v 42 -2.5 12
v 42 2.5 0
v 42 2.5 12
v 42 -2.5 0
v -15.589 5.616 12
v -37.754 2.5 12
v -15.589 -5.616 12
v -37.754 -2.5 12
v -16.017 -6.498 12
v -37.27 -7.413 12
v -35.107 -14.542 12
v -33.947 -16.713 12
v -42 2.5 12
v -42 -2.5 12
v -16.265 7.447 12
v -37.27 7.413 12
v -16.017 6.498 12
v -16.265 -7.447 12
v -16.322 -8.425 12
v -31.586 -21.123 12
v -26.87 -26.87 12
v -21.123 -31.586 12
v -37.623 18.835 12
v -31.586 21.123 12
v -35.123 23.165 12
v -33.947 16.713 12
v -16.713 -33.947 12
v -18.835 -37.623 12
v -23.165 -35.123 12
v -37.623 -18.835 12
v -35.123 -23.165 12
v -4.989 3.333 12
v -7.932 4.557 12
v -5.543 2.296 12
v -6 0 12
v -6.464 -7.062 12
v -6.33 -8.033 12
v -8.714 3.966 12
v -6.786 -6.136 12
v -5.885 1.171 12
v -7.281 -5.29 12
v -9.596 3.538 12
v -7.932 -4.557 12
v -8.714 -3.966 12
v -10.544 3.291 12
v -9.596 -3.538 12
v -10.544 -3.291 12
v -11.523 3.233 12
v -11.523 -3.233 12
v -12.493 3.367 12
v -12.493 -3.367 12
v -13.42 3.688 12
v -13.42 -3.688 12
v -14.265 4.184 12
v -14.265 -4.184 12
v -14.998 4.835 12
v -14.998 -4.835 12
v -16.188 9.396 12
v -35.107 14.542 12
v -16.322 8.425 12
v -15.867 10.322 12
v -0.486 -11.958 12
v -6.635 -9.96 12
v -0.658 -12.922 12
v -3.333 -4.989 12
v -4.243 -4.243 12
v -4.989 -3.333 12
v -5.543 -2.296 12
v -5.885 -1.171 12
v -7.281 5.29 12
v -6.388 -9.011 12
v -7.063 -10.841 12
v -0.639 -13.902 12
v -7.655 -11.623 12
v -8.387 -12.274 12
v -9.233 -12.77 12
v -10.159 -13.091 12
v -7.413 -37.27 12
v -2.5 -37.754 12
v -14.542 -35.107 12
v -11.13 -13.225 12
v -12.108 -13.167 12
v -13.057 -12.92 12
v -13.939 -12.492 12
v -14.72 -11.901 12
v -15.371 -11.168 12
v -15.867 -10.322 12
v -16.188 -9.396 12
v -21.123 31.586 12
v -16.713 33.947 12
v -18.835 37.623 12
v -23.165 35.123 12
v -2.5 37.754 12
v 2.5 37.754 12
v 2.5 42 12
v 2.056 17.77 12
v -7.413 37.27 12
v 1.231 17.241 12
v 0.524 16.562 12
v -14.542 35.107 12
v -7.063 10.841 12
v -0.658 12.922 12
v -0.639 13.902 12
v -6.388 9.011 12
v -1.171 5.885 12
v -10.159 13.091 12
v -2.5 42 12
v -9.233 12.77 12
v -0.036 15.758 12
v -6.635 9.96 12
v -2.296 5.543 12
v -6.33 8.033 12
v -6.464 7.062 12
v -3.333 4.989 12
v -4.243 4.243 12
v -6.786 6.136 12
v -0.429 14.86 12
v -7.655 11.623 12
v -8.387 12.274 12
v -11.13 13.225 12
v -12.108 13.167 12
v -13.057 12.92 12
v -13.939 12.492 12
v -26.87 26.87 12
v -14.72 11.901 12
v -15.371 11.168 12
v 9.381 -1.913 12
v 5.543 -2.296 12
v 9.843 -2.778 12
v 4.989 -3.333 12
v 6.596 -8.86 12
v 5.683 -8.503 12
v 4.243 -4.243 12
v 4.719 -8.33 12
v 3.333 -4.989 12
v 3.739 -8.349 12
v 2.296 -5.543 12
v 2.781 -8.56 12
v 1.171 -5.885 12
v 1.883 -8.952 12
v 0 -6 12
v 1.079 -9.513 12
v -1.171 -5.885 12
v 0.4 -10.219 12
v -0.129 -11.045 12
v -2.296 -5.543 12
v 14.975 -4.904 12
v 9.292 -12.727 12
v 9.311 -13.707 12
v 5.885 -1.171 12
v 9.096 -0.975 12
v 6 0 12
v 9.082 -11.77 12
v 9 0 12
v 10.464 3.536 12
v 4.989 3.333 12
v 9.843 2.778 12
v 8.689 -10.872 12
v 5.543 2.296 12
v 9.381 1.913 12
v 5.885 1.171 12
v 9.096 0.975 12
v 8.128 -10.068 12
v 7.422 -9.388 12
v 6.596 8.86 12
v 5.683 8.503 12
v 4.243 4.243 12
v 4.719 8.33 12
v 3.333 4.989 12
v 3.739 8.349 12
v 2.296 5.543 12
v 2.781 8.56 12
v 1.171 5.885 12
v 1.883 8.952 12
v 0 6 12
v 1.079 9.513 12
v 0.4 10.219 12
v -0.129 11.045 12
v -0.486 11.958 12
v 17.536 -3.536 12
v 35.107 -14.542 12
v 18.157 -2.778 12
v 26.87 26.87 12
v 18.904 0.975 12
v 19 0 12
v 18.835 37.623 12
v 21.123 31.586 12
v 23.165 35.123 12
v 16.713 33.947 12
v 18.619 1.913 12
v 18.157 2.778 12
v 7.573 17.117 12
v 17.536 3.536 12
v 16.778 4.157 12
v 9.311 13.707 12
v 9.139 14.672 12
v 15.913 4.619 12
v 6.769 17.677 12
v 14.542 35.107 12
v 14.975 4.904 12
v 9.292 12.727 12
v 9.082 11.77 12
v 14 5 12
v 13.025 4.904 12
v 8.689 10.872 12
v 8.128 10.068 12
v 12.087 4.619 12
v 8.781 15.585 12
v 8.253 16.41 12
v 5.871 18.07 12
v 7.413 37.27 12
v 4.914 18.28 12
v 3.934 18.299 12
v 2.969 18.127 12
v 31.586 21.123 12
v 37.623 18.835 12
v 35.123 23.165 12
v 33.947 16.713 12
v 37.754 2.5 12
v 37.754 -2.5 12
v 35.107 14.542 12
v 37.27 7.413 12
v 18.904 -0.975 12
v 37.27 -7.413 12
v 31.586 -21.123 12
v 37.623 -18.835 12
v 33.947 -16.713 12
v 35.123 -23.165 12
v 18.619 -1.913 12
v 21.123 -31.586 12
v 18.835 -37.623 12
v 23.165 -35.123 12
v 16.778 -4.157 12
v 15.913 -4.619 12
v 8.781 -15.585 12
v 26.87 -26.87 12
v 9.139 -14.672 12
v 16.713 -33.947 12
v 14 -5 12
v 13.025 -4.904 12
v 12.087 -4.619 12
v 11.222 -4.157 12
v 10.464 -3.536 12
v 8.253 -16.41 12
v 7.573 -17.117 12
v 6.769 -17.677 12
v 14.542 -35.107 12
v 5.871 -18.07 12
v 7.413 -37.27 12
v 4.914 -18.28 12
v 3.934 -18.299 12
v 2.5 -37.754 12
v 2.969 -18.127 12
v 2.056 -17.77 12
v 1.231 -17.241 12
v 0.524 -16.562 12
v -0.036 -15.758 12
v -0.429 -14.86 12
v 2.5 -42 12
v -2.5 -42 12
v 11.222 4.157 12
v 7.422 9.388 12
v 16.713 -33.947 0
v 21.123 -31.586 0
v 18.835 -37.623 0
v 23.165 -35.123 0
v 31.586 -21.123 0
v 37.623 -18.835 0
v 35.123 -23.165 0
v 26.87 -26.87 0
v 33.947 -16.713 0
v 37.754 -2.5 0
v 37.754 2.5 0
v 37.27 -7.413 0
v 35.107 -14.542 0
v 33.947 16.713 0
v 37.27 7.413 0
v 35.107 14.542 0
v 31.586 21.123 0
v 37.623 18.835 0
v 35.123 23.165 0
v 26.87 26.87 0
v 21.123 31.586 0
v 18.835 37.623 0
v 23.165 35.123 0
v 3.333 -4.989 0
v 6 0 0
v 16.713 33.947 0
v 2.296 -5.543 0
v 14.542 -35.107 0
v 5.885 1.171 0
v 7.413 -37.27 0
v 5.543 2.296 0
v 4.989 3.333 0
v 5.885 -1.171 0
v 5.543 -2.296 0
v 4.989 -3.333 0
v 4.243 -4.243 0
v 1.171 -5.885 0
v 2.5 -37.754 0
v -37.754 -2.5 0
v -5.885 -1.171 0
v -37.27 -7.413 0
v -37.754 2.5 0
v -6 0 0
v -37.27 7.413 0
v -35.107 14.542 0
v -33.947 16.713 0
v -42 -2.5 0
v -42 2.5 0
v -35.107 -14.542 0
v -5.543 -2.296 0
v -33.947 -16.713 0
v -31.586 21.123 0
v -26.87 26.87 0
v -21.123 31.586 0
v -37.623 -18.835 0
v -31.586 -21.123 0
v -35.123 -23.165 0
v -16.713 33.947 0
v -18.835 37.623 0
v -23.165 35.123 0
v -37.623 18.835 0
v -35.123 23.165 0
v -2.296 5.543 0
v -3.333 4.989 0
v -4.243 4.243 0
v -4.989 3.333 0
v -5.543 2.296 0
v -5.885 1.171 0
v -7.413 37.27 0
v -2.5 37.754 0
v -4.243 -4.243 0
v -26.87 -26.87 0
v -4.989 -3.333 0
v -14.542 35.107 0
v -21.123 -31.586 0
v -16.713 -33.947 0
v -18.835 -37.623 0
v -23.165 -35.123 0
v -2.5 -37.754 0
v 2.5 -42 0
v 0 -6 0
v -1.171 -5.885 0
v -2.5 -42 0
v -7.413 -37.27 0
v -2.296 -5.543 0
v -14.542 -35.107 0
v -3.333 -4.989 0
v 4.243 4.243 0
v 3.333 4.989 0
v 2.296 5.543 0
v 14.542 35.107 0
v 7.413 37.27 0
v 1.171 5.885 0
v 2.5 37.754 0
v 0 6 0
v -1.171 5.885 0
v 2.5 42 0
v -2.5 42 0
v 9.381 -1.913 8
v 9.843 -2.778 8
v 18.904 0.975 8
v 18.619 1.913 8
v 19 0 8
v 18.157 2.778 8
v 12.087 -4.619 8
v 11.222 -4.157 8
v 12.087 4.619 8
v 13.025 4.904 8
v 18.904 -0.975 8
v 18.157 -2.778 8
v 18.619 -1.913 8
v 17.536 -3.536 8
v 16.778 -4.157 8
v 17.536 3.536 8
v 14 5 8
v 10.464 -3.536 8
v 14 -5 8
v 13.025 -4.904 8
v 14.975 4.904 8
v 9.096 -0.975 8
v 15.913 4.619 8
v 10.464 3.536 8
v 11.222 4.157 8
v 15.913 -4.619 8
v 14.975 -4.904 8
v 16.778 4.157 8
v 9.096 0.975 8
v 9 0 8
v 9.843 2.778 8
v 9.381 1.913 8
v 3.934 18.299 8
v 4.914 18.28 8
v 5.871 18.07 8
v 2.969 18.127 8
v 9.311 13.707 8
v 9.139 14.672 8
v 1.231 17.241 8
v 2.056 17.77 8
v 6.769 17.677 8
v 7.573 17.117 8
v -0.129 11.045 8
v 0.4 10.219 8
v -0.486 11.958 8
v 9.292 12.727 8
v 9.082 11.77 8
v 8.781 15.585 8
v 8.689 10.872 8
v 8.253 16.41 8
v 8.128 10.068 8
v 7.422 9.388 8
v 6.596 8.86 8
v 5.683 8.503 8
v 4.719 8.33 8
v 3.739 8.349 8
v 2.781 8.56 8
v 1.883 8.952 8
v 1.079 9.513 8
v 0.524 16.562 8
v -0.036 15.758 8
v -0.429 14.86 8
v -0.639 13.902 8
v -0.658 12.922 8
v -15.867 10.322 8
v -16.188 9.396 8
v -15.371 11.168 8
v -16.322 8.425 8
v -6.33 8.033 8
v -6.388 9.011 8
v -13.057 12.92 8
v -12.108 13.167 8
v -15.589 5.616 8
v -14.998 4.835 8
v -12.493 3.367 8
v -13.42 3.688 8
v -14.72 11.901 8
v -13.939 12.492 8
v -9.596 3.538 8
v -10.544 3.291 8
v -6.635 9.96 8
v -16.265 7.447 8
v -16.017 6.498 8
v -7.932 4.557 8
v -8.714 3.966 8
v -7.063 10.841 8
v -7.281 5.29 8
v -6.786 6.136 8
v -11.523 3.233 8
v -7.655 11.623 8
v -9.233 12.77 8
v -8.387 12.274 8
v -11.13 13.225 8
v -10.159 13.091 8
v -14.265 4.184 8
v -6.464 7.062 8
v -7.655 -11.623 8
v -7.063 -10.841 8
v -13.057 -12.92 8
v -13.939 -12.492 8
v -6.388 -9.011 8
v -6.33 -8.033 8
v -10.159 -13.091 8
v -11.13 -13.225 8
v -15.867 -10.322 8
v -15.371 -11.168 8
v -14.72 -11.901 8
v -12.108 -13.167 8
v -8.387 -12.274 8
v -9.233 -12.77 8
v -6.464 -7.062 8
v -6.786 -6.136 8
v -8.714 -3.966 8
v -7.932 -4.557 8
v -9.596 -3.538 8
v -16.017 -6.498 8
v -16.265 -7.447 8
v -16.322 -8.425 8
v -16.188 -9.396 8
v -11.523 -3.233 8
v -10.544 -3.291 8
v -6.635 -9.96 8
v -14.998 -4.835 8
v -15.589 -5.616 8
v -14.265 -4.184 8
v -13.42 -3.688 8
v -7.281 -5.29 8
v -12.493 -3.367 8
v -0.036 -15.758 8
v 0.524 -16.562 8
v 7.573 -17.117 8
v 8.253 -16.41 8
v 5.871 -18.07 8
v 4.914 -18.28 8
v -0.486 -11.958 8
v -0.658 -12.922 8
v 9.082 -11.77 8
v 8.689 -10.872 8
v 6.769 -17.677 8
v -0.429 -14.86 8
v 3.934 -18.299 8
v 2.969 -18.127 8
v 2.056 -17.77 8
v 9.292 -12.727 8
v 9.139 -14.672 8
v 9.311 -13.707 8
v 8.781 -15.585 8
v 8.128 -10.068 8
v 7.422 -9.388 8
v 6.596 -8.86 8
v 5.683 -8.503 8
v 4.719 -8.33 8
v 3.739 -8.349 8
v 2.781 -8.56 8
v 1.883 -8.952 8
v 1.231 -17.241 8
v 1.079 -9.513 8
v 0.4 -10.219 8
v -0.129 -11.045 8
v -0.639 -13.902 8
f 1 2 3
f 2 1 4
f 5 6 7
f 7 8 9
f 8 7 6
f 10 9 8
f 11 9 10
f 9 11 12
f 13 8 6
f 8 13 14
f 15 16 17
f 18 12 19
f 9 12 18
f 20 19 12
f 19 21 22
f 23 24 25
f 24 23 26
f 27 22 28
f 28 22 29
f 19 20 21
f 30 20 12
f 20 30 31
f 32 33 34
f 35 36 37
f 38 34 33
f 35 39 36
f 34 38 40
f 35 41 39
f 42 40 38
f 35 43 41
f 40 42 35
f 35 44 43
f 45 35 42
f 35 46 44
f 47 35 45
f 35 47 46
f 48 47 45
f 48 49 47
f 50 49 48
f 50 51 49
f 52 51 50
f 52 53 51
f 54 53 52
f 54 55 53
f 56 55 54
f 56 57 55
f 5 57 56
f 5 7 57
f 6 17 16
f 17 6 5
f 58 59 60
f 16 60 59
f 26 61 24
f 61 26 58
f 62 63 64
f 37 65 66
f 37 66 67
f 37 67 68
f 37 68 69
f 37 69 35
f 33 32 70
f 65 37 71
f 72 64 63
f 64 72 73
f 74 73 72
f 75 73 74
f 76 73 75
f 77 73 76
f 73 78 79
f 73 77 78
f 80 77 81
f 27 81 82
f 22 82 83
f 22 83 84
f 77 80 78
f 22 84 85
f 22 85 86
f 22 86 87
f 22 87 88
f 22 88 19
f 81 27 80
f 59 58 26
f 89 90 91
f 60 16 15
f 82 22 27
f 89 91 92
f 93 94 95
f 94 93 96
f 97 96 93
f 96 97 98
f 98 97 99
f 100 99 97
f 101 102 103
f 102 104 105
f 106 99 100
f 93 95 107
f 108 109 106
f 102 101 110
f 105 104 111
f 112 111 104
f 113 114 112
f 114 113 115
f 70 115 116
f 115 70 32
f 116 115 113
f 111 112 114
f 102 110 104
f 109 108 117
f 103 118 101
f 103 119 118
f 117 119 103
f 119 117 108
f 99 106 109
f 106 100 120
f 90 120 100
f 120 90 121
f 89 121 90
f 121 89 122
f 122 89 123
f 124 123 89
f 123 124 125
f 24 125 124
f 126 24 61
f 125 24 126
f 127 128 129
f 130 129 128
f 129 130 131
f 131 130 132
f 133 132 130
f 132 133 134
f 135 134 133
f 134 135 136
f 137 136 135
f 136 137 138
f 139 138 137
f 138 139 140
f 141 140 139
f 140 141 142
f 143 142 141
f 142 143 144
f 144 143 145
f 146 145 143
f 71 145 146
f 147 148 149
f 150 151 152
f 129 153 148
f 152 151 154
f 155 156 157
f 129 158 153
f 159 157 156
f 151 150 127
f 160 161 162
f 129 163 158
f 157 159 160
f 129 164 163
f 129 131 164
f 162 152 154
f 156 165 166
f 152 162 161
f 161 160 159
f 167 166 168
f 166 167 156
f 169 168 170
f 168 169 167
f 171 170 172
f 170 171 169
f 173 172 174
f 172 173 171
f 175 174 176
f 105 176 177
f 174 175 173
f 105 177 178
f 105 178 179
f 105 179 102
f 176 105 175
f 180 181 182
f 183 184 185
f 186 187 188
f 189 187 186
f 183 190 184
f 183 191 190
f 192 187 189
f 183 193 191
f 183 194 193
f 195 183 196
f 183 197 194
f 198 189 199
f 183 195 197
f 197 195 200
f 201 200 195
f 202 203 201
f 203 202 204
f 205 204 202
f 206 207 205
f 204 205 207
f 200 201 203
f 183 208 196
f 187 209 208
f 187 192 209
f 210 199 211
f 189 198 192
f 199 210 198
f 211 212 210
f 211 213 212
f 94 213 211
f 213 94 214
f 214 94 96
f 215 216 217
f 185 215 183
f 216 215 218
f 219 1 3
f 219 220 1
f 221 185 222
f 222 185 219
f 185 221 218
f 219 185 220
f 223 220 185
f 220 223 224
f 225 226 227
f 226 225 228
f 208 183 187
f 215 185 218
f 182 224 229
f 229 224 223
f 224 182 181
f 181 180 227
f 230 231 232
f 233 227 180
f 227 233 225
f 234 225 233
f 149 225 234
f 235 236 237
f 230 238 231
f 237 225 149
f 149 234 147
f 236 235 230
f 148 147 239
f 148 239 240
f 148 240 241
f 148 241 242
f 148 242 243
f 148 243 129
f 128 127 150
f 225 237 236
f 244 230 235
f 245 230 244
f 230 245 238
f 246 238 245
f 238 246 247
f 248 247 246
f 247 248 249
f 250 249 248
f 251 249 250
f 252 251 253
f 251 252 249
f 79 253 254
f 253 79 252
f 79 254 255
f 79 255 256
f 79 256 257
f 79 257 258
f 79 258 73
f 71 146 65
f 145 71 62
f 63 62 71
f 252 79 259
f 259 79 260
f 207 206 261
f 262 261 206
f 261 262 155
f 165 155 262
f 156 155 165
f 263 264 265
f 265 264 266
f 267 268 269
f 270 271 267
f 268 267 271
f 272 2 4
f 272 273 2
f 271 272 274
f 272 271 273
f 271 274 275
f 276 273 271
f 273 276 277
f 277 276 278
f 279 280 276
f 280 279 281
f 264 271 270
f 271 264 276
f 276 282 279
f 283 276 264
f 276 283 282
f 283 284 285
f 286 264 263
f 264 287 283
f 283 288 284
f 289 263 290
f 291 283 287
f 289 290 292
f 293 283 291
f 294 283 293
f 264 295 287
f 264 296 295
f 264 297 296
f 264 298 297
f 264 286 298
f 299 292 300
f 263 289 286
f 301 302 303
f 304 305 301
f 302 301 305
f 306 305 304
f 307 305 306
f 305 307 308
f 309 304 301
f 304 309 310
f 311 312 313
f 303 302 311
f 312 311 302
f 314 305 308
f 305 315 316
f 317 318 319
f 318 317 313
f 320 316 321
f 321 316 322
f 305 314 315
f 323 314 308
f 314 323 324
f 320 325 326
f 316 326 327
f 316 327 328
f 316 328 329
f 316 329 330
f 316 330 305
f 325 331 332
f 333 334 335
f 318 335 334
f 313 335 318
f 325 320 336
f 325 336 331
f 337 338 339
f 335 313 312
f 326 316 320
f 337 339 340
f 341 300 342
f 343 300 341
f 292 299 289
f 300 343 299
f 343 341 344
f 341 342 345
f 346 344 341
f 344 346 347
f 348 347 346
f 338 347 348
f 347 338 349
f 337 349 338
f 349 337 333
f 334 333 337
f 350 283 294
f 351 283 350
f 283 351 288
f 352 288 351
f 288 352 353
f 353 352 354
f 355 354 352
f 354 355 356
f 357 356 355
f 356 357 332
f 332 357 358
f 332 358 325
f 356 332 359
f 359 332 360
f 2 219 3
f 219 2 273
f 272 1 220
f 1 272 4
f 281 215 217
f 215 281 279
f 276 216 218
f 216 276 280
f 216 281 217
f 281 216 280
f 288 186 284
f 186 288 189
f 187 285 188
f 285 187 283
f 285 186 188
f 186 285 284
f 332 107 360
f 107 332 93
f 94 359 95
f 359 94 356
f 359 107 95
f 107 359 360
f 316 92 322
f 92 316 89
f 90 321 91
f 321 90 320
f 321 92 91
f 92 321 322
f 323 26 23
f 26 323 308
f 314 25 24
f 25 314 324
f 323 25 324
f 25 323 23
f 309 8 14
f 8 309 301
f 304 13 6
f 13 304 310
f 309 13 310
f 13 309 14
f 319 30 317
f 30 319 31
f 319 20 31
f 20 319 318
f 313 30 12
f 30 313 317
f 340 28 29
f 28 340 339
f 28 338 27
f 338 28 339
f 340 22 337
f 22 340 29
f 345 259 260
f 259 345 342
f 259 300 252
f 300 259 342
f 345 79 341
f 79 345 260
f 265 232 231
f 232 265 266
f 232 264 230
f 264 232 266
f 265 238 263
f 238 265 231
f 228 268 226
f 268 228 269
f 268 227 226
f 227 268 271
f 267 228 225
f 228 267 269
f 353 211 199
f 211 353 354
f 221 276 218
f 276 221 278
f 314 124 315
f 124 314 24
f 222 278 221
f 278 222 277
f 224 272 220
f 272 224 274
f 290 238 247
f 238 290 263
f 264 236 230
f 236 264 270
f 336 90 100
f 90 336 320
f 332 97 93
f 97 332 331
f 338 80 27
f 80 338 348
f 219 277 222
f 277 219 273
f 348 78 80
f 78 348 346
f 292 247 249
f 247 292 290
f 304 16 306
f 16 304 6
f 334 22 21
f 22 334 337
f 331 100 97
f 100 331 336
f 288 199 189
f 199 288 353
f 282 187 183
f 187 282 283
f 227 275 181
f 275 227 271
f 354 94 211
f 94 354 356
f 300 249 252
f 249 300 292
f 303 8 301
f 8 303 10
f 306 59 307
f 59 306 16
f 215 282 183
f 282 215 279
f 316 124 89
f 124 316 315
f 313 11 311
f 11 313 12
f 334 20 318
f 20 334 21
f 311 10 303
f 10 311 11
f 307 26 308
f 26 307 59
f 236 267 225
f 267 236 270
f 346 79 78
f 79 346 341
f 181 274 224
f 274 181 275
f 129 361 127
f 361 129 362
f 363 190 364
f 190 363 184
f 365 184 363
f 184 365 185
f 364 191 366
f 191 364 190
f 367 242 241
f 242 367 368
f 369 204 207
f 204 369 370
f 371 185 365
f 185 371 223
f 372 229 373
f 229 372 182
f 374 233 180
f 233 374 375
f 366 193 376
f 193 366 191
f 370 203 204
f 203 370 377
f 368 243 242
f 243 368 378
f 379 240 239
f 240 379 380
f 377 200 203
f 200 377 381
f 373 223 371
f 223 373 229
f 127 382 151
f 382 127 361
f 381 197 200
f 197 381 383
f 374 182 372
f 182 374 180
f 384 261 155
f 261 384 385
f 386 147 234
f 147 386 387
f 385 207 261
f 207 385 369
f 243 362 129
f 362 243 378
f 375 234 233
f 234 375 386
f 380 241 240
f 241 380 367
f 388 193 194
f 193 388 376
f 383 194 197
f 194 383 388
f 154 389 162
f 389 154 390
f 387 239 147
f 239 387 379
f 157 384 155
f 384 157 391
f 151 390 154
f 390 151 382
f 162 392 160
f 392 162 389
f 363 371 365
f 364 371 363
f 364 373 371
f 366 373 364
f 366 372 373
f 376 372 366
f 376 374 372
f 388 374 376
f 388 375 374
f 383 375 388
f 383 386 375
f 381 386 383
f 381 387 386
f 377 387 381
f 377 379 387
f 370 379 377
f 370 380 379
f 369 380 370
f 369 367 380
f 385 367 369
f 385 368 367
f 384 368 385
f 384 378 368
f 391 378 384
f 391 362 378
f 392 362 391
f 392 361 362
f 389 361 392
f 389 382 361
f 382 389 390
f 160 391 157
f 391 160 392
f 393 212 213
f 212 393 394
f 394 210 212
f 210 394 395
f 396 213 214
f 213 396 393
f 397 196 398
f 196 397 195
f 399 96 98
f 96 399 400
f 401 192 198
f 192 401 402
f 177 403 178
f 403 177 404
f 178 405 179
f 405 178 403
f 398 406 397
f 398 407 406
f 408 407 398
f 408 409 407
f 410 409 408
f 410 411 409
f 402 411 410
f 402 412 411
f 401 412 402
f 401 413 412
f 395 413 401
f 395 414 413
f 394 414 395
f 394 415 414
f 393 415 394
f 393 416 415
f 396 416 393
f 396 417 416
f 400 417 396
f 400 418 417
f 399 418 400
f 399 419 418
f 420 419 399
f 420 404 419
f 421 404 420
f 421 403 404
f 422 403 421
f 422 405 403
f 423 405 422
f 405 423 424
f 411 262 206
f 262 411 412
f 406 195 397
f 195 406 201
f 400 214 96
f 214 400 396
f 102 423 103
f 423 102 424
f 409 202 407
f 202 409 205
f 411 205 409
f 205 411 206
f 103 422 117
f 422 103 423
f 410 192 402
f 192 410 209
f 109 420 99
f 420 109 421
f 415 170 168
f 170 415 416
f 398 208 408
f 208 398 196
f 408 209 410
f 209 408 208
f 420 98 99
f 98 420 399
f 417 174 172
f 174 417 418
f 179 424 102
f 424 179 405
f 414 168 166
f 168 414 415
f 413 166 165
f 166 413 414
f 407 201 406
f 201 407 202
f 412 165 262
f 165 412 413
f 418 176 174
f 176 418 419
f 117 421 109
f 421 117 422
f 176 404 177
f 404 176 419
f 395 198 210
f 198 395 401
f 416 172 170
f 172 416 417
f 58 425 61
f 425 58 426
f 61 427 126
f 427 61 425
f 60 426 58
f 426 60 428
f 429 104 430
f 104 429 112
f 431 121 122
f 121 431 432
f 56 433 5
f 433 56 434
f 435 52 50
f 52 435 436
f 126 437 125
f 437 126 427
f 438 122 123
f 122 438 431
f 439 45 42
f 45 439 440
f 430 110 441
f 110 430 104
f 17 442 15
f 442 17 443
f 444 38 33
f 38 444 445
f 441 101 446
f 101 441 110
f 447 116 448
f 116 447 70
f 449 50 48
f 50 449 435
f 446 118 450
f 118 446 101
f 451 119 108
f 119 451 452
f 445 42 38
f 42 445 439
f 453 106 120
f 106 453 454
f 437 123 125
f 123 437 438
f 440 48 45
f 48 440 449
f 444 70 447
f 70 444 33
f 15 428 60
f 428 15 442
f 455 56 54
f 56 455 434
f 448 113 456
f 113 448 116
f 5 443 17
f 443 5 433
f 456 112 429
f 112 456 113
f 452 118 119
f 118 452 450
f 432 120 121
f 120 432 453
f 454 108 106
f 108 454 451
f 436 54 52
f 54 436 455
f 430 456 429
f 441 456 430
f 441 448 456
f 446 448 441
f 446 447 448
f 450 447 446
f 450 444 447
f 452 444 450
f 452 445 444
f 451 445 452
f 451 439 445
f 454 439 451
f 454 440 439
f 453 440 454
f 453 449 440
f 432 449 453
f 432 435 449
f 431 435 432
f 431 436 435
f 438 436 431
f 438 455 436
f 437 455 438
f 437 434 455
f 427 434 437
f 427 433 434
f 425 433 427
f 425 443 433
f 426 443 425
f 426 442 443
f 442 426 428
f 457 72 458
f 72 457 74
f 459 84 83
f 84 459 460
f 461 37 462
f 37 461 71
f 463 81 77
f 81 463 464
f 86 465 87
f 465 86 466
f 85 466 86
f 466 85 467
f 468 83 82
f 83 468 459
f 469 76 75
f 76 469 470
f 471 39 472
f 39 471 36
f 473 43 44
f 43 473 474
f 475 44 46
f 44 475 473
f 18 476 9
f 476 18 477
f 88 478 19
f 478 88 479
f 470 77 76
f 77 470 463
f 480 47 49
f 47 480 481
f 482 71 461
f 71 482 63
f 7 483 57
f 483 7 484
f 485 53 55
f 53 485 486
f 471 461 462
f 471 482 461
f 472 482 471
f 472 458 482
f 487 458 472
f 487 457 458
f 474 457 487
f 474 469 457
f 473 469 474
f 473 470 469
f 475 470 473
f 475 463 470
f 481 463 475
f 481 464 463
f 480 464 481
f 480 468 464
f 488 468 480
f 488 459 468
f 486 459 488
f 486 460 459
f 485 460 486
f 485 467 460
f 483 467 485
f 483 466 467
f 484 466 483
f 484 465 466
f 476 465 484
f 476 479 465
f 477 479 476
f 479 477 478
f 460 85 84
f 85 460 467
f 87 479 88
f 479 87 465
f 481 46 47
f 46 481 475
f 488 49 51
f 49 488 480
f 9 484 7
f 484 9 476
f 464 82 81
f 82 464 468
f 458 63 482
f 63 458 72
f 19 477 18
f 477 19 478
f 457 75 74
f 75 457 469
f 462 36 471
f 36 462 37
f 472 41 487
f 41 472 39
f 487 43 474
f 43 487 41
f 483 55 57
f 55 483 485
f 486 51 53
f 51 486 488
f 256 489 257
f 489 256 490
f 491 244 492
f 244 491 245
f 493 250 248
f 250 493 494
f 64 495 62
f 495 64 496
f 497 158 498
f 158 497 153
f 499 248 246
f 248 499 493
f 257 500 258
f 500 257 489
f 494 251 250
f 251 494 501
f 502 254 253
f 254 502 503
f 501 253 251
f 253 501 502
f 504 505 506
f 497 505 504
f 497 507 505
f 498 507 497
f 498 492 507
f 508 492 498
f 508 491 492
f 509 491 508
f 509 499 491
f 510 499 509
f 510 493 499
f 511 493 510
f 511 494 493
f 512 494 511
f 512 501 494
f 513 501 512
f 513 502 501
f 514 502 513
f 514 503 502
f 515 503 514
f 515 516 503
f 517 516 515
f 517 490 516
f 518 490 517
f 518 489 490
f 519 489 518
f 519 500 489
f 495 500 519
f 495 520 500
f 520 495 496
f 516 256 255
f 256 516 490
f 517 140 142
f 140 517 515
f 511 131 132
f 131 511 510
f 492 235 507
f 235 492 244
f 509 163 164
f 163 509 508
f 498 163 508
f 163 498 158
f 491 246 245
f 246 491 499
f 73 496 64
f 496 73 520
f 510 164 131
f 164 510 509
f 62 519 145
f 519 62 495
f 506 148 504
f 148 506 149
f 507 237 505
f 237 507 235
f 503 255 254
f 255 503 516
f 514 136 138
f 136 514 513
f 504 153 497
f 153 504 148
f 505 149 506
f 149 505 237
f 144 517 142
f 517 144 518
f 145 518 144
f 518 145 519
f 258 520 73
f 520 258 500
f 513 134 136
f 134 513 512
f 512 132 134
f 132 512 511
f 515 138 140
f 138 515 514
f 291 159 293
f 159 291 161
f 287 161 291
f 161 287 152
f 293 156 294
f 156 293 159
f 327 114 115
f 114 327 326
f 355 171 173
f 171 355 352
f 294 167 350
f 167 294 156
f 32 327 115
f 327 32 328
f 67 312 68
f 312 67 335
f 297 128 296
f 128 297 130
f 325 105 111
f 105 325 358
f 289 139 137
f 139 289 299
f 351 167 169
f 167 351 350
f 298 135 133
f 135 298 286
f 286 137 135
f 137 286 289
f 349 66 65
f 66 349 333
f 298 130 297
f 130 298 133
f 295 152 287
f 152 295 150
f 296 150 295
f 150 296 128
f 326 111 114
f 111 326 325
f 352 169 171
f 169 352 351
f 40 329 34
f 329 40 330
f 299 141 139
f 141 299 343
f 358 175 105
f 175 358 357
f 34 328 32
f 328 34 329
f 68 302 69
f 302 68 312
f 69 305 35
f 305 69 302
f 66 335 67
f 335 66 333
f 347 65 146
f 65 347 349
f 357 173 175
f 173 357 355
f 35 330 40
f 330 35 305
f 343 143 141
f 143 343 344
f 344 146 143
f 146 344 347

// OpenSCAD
$fn = 32;

// ----------------------------------------------------------------------
// Spur blank: lightened gear blank
// ----------------------------------------------------------------------

// --- parameters (mm) ---
disc_r = 38;              // blank root radius
disc_t = 12;              // blank thickness
n_teeth = 12;             // stub tooth count
tooth_w = 5;              // tooth width at the root
tooth_h = 4;              // tooth height above the root
bore_r = 6;               // central bore radius
ring_r = 14;              // lightening pocket ring radius
pocket_r = 5;             // lightening pocket radius

out_r = disc_r + tooth_h;  // tip radius
bbox_x = 84.0;  // measured width over the teeth
bbox_y = 84.0;  // measured depth over the teeth

difference() {
union() {
  cylinder(r = disc_r, h = disc_t);
  for (i = [0 : n_teeth - 1])
    rotate([0, 0, i * 360 / n_teeth])
      translate([disc_r - 1, -tooth_w / 2, 0])
        cube([tooth_h + 1, tooth_w, disc_t]);
}
  translate([0, 0, -1]) cylinder(r = bore_r, h = disc_t + 2);
  for (i = [0 : 5])
    rotate([0, 0, i * 72])
      translate([ring_r, 0, disc_t - 4])
        cylinder(r = pocket_r, h = 5);
}
